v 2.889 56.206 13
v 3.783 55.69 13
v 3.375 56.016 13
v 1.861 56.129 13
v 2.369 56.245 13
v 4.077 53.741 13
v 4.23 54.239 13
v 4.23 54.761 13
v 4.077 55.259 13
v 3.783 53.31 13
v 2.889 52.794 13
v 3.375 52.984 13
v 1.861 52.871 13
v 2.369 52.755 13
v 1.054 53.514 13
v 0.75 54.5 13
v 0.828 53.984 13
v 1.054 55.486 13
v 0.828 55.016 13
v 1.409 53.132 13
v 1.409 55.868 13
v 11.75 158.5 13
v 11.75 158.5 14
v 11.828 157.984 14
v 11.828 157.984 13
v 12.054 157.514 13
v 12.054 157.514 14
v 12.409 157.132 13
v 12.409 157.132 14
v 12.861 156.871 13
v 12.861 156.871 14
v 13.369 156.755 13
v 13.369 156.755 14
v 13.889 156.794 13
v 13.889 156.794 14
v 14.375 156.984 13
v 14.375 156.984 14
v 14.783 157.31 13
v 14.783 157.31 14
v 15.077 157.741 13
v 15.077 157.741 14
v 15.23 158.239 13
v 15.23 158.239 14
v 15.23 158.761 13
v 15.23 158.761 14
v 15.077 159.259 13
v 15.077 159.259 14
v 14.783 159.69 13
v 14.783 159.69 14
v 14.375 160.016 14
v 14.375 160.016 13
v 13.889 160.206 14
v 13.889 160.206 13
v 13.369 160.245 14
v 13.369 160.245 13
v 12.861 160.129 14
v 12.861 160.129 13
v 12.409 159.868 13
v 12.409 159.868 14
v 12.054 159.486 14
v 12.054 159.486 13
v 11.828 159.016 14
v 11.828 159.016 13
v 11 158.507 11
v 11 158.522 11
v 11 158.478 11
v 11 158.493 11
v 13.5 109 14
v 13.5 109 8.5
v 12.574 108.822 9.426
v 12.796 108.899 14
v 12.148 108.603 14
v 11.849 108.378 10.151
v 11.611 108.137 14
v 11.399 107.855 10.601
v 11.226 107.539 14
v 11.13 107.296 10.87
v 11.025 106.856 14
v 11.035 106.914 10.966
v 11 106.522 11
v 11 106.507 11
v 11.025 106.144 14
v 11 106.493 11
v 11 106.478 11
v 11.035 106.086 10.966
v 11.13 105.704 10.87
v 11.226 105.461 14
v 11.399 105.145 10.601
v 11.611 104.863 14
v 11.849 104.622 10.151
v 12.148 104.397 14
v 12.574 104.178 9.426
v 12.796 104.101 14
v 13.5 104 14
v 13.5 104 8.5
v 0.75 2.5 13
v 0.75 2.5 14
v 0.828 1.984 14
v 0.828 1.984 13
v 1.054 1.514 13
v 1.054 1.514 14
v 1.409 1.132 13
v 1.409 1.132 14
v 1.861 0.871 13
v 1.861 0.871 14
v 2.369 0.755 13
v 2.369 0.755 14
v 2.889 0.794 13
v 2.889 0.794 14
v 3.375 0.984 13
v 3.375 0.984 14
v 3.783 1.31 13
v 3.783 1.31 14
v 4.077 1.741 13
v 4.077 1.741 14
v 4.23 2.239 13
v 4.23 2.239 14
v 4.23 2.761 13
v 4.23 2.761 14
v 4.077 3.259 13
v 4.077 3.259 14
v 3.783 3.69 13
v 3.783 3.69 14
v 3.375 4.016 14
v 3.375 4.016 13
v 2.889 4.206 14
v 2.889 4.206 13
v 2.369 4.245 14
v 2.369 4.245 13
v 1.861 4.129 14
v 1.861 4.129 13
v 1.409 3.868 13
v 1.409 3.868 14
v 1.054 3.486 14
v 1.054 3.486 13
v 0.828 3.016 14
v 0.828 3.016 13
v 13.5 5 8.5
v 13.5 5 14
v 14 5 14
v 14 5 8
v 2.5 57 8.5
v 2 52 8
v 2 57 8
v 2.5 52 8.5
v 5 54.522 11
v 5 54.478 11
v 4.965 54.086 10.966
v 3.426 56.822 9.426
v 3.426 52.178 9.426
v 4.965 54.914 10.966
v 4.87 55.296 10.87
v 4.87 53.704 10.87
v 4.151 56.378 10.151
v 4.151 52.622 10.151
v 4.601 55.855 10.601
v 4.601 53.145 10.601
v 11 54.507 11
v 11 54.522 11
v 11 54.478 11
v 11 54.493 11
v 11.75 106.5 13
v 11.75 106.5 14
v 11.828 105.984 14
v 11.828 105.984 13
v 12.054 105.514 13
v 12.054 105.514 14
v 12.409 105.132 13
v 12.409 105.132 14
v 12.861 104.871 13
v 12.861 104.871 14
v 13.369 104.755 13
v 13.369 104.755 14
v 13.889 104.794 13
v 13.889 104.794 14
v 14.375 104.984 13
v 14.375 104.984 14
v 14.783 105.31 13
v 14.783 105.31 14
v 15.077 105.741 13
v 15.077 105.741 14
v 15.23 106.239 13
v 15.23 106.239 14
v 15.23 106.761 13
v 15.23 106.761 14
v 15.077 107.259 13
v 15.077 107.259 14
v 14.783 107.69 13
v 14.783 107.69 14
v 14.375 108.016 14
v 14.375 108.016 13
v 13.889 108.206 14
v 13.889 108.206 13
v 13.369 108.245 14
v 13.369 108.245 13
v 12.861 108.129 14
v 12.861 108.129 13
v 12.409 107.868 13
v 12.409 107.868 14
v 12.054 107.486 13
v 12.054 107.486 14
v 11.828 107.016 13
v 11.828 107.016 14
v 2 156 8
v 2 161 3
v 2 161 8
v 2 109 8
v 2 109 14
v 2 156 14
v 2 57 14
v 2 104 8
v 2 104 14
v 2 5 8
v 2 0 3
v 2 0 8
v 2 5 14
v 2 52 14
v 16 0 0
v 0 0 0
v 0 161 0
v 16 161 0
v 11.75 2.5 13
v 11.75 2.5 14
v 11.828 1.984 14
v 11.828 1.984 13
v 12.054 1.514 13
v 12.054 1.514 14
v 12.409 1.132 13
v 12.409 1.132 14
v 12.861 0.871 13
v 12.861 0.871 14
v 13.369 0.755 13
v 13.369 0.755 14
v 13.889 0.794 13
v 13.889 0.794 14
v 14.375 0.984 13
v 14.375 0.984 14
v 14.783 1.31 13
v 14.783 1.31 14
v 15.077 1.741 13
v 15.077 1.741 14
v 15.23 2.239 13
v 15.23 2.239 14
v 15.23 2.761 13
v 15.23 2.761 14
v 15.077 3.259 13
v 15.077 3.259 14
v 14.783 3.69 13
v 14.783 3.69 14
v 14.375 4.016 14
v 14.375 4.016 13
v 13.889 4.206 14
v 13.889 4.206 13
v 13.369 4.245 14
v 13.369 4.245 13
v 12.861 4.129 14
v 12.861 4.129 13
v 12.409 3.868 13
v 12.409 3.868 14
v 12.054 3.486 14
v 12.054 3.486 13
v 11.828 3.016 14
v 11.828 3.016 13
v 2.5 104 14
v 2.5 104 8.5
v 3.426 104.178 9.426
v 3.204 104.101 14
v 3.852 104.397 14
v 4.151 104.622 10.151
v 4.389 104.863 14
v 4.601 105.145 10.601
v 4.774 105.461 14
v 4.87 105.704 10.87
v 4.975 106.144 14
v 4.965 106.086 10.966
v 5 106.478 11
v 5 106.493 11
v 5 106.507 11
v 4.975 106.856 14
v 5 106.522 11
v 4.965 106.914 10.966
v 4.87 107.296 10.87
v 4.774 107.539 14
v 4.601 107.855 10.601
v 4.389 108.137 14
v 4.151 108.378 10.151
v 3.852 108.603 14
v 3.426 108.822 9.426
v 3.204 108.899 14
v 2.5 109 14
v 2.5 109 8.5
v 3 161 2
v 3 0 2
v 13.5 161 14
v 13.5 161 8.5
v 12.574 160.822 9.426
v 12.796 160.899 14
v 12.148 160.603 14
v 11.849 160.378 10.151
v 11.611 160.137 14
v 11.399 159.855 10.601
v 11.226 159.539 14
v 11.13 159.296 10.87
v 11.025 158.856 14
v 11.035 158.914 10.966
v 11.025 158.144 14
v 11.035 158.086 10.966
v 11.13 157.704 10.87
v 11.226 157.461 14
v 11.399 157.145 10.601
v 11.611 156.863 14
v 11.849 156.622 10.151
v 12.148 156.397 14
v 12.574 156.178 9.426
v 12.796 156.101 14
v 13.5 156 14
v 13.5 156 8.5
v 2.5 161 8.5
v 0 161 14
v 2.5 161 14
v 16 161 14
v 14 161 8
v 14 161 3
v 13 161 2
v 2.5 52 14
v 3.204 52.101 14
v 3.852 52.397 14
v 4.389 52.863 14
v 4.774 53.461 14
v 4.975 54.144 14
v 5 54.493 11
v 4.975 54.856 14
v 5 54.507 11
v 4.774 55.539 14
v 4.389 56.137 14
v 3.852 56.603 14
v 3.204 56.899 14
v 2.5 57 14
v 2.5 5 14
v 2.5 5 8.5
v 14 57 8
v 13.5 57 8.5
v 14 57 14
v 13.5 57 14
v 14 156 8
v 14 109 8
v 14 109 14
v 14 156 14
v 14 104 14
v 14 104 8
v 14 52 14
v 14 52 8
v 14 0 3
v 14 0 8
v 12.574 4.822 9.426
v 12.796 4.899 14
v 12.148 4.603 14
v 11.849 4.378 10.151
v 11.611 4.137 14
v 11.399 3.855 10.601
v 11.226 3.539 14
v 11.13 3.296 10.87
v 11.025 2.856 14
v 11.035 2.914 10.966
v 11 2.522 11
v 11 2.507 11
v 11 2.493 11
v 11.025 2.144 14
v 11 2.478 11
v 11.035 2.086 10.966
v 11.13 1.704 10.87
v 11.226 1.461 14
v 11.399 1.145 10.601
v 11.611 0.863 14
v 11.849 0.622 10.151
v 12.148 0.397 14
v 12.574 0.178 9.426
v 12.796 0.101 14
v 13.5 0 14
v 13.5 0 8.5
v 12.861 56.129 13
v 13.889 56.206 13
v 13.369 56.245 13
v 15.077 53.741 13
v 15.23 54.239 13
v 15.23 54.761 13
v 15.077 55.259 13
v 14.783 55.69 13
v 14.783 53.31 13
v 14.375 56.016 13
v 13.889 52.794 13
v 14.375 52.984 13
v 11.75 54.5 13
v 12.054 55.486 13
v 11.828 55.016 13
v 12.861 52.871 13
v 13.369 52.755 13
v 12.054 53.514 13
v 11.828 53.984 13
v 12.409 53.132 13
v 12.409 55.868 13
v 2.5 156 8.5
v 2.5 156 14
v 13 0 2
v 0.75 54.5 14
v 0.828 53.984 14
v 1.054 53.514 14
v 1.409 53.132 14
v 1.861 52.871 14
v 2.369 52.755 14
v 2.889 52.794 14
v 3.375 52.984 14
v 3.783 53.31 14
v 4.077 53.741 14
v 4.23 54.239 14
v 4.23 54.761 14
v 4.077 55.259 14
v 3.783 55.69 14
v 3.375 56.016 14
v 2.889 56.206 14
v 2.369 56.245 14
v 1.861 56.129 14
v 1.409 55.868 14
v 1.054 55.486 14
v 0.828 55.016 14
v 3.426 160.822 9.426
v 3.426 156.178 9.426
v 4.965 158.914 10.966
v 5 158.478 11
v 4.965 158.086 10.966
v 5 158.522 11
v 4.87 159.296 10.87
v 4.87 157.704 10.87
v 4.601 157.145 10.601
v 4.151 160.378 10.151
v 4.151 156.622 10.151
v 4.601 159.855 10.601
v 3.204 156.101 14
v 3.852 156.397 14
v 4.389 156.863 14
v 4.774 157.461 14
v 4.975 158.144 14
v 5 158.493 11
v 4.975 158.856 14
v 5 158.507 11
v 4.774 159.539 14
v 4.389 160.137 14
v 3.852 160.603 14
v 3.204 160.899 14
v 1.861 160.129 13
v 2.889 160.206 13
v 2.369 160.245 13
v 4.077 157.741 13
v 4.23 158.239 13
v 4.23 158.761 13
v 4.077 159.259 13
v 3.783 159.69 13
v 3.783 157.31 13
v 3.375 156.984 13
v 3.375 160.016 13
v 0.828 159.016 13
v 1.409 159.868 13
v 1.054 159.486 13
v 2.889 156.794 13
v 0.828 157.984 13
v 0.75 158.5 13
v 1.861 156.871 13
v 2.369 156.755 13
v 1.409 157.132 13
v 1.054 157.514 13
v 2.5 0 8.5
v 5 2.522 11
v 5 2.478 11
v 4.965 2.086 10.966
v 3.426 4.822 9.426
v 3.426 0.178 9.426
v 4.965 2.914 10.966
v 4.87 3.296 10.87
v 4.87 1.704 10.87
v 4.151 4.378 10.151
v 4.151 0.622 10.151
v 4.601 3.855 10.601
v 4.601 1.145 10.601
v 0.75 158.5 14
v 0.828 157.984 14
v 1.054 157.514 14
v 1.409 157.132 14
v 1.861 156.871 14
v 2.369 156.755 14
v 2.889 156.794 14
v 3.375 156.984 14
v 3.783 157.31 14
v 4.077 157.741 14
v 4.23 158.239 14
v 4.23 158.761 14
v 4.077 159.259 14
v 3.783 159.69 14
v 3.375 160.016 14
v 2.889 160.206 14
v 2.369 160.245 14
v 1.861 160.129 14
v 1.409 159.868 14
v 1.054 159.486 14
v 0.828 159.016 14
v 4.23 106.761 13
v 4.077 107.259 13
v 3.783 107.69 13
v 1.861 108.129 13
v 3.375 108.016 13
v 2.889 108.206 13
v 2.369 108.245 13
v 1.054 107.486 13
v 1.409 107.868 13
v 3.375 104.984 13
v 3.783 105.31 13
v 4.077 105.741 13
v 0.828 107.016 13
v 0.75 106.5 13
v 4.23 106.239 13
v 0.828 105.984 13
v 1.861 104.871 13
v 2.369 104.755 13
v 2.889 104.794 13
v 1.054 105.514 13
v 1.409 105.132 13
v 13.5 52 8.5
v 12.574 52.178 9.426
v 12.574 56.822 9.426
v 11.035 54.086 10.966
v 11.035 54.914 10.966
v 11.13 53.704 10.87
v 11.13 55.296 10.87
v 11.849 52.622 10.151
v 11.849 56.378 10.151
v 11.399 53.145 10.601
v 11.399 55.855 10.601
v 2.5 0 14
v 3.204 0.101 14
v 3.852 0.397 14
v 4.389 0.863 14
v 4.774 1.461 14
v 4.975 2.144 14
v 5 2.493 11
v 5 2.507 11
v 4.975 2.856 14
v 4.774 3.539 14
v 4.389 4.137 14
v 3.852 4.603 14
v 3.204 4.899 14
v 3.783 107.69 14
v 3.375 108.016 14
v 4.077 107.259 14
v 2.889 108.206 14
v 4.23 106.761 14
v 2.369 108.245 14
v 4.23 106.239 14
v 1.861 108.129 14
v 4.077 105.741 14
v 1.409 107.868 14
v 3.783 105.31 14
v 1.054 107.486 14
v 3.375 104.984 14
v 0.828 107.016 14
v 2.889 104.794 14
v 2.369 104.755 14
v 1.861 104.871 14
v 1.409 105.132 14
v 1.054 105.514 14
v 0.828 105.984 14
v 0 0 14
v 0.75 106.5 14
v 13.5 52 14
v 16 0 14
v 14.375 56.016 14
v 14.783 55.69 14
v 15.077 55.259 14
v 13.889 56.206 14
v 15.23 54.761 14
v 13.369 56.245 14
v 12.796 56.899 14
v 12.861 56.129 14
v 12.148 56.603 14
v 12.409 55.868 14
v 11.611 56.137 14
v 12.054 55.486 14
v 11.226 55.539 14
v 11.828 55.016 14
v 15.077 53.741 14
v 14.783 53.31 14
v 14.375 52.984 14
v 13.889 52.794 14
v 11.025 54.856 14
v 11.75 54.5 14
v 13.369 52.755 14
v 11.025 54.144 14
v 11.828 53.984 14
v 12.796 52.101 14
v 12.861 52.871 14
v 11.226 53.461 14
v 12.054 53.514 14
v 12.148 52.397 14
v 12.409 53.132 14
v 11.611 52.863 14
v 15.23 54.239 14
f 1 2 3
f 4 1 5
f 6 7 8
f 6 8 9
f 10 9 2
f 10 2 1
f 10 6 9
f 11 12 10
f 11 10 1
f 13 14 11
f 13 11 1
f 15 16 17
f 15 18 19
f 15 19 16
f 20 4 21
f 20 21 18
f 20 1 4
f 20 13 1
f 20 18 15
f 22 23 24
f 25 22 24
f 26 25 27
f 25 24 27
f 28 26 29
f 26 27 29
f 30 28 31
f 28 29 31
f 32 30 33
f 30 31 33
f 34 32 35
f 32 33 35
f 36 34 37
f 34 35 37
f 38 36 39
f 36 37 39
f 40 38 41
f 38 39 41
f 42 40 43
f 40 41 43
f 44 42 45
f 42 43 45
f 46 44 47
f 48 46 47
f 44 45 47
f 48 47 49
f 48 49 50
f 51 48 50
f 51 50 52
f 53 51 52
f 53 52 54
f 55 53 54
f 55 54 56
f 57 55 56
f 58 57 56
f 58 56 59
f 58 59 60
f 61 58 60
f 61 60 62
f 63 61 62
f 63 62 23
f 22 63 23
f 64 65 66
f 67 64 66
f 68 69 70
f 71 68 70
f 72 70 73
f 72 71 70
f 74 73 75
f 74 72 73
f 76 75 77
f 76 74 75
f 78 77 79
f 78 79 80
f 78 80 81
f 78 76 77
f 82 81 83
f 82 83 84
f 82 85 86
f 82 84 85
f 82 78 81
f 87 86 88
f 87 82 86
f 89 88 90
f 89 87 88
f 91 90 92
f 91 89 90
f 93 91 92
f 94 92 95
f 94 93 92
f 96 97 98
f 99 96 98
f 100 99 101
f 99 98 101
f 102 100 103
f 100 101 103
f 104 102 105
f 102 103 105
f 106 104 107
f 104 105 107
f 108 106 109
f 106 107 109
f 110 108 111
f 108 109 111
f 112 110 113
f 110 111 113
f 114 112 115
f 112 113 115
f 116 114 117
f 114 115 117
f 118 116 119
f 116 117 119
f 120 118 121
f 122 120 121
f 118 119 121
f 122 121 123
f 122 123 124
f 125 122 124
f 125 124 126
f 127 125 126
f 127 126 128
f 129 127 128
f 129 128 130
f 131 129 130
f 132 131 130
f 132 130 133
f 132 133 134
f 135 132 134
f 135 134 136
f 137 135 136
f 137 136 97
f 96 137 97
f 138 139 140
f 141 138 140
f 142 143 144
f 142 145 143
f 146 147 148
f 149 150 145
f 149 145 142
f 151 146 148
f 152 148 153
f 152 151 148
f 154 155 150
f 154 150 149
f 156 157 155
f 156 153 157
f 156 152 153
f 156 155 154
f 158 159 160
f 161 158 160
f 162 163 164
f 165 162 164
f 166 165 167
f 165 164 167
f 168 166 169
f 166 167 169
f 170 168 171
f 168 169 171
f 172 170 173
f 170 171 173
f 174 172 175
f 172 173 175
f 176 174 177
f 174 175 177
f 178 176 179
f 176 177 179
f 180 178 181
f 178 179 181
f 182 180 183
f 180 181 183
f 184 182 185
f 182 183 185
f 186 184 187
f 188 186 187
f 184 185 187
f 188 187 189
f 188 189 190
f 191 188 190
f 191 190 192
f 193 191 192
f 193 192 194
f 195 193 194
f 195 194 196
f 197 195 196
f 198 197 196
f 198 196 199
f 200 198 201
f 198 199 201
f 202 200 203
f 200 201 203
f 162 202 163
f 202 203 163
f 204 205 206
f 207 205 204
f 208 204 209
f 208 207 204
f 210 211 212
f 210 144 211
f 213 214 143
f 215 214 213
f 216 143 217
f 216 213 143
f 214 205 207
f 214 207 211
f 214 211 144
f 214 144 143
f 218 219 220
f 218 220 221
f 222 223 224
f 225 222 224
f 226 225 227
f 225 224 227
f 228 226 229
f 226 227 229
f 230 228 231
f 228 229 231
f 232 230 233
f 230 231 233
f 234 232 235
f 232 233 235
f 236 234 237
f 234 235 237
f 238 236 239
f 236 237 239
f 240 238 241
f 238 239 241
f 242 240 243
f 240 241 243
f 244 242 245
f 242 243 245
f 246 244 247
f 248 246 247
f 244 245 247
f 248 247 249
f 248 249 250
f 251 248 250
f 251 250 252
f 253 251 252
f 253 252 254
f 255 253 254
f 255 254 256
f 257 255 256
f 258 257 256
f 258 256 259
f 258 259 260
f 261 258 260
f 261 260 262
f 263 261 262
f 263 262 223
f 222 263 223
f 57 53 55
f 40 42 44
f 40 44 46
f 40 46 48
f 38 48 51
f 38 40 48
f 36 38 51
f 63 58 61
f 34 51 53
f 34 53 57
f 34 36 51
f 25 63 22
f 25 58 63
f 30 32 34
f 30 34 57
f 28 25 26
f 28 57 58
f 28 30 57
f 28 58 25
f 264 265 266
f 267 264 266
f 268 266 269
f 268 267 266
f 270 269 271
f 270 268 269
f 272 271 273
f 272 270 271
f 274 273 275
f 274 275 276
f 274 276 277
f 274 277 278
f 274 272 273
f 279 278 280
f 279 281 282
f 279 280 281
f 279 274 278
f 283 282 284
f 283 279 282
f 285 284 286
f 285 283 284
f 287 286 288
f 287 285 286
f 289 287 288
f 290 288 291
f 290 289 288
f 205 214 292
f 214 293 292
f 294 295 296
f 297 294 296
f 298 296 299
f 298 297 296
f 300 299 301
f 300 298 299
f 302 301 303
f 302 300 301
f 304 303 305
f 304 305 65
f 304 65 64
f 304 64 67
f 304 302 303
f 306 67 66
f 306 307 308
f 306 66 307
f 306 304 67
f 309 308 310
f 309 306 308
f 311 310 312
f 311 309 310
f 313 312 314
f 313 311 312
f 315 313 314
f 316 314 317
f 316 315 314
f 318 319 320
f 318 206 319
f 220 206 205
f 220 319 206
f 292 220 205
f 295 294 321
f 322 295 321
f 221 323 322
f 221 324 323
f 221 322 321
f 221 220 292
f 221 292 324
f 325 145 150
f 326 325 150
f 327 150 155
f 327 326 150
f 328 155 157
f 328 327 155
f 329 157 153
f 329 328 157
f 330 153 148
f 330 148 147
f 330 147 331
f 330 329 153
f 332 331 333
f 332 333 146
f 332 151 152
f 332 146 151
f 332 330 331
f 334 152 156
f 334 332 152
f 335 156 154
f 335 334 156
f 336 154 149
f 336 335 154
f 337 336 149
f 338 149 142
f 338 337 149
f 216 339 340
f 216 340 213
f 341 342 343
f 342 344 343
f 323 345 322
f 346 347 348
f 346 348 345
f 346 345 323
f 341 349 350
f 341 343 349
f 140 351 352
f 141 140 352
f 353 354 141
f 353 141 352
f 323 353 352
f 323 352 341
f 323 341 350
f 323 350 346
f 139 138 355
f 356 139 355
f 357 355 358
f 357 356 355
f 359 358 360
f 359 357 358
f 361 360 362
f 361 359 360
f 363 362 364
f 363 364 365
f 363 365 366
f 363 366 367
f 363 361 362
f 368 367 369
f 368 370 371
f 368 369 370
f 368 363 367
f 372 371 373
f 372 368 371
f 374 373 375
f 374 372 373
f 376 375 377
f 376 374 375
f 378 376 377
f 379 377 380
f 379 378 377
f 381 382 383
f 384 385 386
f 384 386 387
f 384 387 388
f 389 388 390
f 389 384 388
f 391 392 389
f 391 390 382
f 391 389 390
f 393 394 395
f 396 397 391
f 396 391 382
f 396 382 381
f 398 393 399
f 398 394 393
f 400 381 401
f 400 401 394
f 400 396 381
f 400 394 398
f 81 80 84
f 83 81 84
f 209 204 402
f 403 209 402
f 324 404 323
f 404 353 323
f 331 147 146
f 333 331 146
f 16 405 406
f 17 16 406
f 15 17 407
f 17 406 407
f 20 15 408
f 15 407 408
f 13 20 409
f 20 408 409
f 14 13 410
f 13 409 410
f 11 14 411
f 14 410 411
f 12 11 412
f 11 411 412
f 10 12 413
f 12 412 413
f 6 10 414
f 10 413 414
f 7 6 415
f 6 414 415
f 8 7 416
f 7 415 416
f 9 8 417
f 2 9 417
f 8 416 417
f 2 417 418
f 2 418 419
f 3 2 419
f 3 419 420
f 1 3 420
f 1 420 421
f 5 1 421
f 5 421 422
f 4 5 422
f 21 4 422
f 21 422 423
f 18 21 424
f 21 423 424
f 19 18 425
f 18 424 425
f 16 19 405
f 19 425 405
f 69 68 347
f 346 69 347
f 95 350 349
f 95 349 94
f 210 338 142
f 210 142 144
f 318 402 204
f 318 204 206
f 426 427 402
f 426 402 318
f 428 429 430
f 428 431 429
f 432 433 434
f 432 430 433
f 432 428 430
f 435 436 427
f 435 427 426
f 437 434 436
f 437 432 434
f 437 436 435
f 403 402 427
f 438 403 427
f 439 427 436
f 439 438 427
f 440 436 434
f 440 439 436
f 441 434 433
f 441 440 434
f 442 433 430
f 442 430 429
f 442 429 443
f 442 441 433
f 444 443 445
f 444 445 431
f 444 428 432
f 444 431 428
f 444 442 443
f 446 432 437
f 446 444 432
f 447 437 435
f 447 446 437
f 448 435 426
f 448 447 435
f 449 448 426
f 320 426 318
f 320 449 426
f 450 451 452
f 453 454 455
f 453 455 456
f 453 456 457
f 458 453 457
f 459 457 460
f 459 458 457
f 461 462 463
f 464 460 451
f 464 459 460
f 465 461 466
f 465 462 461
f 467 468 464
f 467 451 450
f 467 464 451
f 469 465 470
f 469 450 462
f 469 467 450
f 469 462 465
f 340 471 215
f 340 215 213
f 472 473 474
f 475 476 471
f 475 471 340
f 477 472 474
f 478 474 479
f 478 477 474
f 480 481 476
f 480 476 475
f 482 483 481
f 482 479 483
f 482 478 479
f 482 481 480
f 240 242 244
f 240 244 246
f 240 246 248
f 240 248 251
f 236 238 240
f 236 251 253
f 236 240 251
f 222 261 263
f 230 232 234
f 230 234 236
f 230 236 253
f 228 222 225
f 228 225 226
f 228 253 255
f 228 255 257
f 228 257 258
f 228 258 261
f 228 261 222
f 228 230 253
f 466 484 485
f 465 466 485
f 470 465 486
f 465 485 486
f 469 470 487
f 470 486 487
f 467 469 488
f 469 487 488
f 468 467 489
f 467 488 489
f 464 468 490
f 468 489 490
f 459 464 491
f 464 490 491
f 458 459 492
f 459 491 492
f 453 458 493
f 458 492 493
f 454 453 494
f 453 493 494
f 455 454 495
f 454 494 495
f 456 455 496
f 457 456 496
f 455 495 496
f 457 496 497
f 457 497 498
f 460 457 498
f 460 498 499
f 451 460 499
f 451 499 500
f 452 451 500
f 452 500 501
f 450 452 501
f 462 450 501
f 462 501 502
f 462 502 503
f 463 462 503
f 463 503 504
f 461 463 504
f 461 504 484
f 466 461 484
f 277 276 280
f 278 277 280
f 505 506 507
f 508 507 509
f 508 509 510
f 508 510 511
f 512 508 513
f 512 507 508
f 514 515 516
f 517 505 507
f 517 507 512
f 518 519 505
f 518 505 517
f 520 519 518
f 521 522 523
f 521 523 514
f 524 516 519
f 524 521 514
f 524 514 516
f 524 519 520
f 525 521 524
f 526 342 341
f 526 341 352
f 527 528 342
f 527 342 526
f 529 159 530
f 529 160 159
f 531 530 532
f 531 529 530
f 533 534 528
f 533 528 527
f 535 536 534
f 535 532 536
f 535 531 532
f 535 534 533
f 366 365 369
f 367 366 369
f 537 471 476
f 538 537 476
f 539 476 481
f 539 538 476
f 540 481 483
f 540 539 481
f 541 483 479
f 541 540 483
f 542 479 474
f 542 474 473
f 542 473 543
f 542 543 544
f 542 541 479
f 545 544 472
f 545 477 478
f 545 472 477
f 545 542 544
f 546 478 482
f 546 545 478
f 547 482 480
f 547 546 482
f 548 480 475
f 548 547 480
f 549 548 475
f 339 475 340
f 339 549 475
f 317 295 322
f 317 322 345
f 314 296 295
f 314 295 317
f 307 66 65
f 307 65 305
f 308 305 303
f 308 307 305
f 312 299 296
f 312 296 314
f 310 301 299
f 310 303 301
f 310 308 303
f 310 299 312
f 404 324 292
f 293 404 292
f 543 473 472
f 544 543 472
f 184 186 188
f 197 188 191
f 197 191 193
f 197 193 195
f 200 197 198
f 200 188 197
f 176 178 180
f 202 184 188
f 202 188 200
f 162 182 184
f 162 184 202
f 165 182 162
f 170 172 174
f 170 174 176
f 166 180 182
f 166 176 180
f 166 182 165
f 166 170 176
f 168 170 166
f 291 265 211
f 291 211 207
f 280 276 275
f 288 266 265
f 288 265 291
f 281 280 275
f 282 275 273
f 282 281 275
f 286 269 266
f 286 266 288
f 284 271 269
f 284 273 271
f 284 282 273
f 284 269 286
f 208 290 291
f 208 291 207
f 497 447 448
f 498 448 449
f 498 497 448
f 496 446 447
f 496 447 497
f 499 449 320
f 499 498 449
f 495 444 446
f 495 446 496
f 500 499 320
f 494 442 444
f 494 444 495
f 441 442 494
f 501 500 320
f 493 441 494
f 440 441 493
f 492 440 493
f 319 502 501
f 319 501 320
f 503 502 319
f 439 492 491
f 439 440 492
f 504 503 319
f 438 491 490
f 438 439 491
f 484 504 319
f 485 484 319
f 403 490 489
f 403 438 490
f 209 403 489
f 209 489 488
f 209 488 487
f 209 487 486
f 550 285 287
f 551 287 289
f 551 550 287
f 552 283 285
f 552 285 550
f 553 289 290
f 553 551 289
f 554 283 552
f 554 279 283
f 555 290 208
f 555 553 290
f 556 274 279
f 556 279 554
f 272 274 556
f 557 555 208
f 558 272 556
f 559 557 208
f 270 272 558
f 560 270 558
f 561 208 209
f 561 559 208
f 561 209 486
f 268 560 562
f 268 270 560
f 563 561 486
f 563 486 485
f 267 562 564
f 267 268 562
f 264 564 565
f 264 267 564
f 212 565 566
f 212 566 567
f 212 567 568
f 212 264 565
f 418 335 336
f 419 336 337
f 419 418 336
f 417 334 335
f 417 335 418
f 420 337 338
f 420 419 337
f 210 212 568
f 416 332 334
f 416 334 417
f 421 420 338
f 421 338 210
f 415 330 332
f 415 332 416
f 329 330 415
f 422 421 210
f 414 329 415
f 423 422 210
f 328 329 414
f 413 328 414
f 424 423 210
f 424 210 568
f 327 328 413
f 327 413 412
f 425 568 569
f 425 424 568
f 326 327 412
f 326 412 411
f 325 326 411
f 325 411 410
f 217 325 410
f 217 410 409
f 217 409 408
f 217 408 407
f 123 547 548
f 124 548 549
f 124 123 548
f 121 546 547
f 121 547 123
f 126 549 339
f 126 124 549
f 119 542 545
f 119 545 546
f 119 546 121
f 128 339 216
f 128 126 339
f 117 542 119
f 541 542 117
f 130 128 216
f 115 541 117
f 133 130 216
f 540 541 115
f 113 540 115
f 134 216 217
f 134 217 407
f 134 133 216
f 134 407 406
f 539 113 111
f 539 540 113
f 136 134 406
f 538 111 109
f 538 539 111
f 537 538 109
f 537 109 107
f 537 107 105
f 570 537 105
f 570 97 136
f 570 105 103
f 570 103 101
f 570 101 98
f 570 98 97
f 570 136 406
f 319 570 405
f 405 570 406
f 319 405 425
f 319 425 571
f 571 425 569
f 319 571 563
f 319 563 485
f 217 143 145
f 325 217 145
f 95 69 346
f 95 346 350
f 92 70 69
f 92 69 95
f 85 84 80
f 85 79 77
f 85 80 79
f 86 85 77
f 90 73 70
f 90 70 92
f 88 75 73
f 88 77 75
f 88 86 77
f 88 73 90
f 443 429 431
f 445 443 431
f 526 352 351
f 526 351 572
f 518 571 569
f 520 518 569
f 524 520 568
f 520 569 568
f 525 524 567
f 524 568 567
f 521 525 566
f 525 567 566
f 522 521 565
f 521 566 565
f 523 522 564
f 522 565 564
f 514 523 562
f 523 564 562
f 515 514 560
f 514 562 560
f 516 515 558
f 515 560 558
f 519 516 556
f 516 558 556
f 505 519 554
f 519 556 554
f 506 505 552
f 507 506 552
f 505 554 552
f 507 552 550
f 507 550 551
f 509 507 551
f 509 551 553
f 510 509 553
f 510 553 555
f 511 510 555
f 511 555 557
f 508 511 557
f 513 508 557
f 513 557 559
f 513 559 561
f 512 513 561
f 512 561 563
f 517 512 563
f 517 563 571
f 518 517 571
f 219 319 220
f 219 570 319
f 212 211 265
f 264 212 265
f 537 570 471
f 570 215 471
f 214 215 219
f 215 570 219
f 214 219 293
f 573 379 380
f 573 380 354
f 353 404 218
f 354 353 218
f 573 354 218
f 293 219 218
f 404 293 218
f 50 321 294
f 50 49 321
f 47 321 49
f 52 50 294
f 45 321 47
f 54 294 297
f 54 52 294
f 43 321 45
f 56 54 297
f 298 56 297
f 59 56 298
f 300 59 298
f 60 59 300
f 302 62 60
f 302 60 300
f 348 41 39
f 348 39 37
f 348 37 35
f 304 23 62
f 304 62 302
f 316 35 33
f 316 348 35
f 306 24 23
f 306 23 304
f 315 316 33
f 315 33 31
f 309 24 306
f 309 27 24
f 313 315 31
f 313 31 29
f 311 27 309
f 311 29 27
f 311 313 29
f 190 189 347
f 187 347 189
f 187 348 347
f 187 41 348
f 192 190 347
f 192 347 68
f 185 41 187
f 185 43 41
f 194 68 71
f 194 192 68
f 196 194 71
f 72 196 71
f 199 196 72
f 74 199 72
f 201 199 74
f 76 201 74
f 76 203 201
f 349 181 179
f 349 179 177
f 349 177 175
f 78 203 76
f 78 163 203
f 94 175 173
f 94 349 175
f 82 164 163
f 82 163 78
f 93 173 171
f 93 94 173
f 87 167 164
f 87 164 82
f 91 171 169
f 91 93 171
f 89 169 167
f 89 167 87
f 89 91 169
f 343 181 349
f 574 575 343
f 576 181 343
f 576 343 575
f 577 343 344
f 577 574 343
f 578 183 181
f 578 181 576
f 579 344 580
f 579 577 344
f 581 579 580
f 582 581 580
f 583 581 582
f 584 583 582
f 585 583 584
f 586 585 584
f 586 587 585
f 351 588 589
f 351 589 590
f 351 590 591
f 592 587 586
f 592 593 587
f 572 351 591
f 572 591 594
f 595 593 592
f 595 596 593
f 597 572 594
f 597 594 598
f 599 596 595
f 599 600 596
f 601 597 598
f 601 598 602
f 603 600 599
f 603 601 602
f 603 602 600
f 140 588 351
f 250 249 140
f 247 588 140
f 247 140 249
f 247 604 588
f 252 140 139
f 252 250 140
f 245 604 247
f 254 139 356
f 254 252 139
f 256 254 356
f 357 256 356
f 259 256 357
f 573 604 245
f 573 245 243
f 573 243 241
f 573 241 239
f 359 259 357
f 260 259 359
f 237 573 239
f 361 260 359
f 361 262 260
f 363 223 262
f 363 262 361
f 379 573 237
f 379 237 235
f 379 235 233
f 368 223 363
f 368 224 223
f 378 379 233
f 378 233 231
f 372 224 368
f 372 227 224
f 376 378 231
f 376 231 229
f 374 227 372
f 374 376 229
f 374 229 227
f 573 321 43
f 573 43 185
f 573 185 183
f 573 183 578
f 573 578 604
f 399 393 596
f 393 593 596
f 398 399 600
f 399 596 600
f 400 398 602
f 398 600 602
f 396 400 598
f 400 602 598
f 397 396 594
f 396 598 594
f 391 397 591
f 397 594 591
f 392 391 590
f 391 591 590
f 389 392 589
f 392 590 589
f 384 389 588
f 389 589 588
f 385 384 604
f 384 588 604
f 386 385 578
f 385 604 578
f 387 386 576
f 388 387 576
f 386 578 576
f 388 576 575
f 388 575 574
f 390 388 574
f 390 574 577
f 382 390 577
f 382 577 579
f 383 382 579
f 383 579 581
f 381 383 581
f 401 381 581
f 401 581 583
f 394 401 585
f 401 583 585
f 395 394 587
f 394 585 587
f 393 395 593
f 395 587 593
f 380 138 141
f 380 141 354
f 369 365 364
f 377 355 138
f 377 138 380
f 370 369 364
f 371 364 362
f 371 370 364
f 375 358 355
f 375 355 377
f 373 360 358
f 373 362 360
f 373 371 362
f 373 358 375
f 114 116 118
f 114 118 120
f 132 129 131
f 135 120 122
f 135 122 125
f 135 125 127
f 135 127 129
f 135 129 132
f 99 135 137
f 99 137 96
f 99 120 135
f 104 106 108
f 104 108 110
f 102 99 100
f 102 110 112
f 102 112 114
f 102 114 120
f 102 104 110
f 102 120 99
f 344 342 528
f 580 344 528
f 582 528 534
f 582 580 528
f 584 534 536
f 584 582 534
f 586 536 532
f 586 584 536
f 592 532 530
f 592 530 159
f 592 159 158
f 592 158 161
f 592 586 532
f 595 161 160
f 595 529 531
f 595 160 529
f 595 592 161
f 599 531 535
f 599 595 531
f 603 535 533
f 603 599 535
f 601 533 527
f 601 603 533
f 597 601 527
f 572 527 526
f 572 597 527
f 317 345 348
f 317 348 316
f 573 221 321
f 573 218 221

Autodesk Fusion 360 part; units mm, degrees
sketch "3D-printed conduit outline" plane through (0, 0, 0) normal (0, 1, 0) x (1, 0, 0)
  line L0 (0, 0) -> (16, 0)
  line L1 (16, 0) -> (16, -14)
  line L2 (16, -14) -> (0, -14)
  line L3 (0, -14) -> (0, 0)
  line L4 (2, -14) -> (14, -14)
  line L5 (14, -14) -> (14, -2)
  line L6 (14, -2) -> (2, -2)
  line L7 (2, -2) -> (2, -14)
  dimension "d8" = 14
  dimension "d9" = 16
  dimension "d10" = 2
  dimension "d11" = 2
  dimension "d12" = 2
extrude "Extrude1" add sketch "3D-printed conduit outline" along normal blind 161 contours L0 L1 L2 L3 L5 L6 L7
sketch "Magnet holders" plane through (0, 0, 14) normal (0, 0, 1) x (-1, 0, 0)
  line L0 (0, 0) -> (-2, 0)
  line L1 (-2, 0) -> (-2, -161)
  line L2 (-2, -161) -> (0, -161)
  line L3 (0, -161) -> (0, 0)
  line L4 (-14, 0) -> (-16, 0)
  line L5 (-16, 0) -> (-16, -161)
  line L6 (-16, -161) -> (-14, -161)
  line L7 (-14, -161) -> (-14, 0)
  circle A0 centre (-2.5, -2.5) radius 2.5
  circle A1 centre (-2.5, -2.5) radius 1.75
  line L8 (-14, 0) -> (-2, 0)
  line L9 (0, 0) -> (-2.5, 0)
  line L10 (-2.5, 0) -> (-2.5, -5)
  line L11 (-2.5, -5) -> (0, -5)
  line L12 (0, -5) -> (0, 0)
  circle A2 centre (-13.5, -2.5) radius 2.5
  circle A3 centre (-13.5, -2.5) radius 1.75
  line L13 (-16, 0) -> (-13.5, 0)
  line L14 (-13.5, 0) -> (-13.5, -5)
  line L15 (-13.5, -5) -> (-16, -5)
  line L16 (-16, -5) -> (-16, 0)
  circle A4 centre (-2.5, -54.5) radius 1.75
  circle A5 centre (-2.5, -54.5) radius 2.5
  line L17 (-2.5, -52) -> (-2.5, -57)
  line L18 (-2.5, -57) -> (0, -57)
  line L19 (0, -57) -> (0, -52)
  line L20 (0, -52) -> (-2.5, -52)
  circle A6 centre (-13.5, -54.5) radius 1.75
  circle A7 centre (-13.5, -54.5) radius 2.5
  line L21 (-13.5, -52) -> (-13.5, -57)
  line L22 (-13.5, -57) -> (-16, -57)
  line L23 (-16, -57) -> (-16, -52)
  line L24 (-16, -52) -> (-13.5, -52)
  circle A8 centre (-2.5, -106.5) radius 1.75
  circle A9 centre (-2.5, -106.5) radius 2.5
  line L25 (-2.5, -104) -> (-2.5, -109)
  line L26 (-2.5, -109) -> (0, -109)
  line L27 (0, -109) -> (0, -104)
  line L28 (0, -104) -> (-2.5, -104)
  circle A10 centre (-13.5, -106.5) radius 1.75
  circle A11 centre (-13.5, -106.5) radius 2.5
  line L29 (-13.5, -104) -> (-13.5, -109)
  line L30 (-13.5, -109) -> (-16, -109)
  line L31 (-16, -109) -> (-16, -104)
  line L32 (-16, -104) -> (-13.5, -104)
  circle A12 centre (-2.5, -158.5) radius 1.75
  circle A13 centre (-2.5, -158.5) radius 2.5
  line L33 (-2.5, -156) -> (-2.5, -161)
  line L34 (-2.5, -161) -> (0, -161)
  line L35 (0, -161) -> (0, -156)
  line L36 (0, -156) -> (-2.5, -156)
  circle A14 centre (-13.5, -158.5) radius 1.75
  circle A15 centre (-13.5, -158.5) radius 2.5
  line L37 (-13.5, -156) -> (-13.5, -161)
  line L38 (-13.5, -161) -> (-16, -161)
  line L39 (-16, -161) -> (-16, -156)
  line L40 (-16, -156) -> (-13.5, -156)
  dimension "d15" = 5
  dimension "d16" = 3.5
  dimension "d17" = 5
  dimension "d18" = 3.5
  dimension "d21" = 0
  dimension "d22" = -156
extrude "Extrude2" add sketch "Magnet holders" against normal blind 3 contours A2 A3 L14 | L7 A2 A3 L14 | L7 L8 A2 L13 | L1 A0 L8 L9 | L1 A0 A1 L10 | A0 A1 L10 | L1 A0 A1 L10 | L1 A0 L11 | L1 A1 L10 | A1 L10 | L7 A3 L14 | A3 L14 | L1 A5 L20 | L7 A2 L15 | L7 A2 A3 L14 | L1 A4 A5 L17 | L1 A4 A5 L17 | L1 A5 L18 | A4 A5 L17 | L1 A4 L17 | A4 L17 | L7 A7 L24 | L1 A9 L28 | L7 A6 A7 L21 | A6 A7 L21 | L1 A8 A9 L25 | L1 A8 A9 L25 | L1 A9 L26 | A8 A9 L25 | L7 A6 L21 | A6 L21 | L7 A7 L22 | L7 A6 A7 L21 | L1 A8 L25 | A8 L25 | L1 A13 L36 | L7 A11 L32 | L1 A12 A13 L33 | L1 A12 A13 L33 | L1 A13 L34 | A12 A13 L33 | L7 A10 A11 L29 | L7 A11 L30 | L7 A10 A11 L29 | A10 A11 L29 | L1 A12 L33 | A12 L33 | L7 A10 L29 | A10 L29 | L7 A15 L40 | L7 A14 A15 L37 | L7 A15 L38 | L7 A14 A15 L37 | A14 A15 L37 | L7 A14 L37 | A14 L37
extrude "Extrude3" cut sketch "Magnet holders" against normal blind 1 contours L1 A1 | L1 A1 L10 | A1 L10 | L7 A3 L14 | A3 L14 | L7 A3 | L1 A4 | L1 A4 L17 | A4 L17 | L7 A6 L21 | L7 A6 | A6 L21 | L1 A8 | L1 A8 L25 | A8 L25 | L1 A12 | L1 A12 L33 | A12 L33 | L7 A10 L29 | L7 A10 | A10 L29 | L7 A14 L37 | L7 A14 | A14 L37
chamfer "Chamfer1" distance 1 angle 45 2 edges at (2, 80.5, 2) (14, 80.5, 2)
chamfer "Chamfer2" distance 2.9999 angle 45 8 edges at (2, 2.5, 11) (2, 54.5, 11) (2, 106.5, 11) (2, 158.5, 11) (14, 2.5, 11) (14, 54.5, 11) (14, 106.5, 11) (14, 158.5, 11)
equation "conduit_length = 161 mm"
equation "conduit_width = 16 mm"
equation "conduit_height = 16 mm"
equation "conduit_wall_thickness = 2 mm"
equation "magnet_diameter = 3 mm"
equation "magnet_height = 1 mm"
equation "d8 = conduit_height - conduit_wall_thickness"
equation "d9 = conduit_width"
equation "d10 = conduit_wall_thickness"
equation "d11 = conduit_wall_thickness"
equation "d12 = conduit_wall_thickness"
equation "d13 = conduit_length"
equation "d15 = magnet_diameter + 2 mm"
equation "d16 = magnet_diameter + 0.5 mm"
equation "d17 = magnet_diameter + 2 mm"
equation "d18 = magnet_diameter + 0.5 mm"
equation "d22 = -conduit_length + ( magnet_diameter + 2 mm )"
equation "d23 = -( magnet_height + 2 mm )"
